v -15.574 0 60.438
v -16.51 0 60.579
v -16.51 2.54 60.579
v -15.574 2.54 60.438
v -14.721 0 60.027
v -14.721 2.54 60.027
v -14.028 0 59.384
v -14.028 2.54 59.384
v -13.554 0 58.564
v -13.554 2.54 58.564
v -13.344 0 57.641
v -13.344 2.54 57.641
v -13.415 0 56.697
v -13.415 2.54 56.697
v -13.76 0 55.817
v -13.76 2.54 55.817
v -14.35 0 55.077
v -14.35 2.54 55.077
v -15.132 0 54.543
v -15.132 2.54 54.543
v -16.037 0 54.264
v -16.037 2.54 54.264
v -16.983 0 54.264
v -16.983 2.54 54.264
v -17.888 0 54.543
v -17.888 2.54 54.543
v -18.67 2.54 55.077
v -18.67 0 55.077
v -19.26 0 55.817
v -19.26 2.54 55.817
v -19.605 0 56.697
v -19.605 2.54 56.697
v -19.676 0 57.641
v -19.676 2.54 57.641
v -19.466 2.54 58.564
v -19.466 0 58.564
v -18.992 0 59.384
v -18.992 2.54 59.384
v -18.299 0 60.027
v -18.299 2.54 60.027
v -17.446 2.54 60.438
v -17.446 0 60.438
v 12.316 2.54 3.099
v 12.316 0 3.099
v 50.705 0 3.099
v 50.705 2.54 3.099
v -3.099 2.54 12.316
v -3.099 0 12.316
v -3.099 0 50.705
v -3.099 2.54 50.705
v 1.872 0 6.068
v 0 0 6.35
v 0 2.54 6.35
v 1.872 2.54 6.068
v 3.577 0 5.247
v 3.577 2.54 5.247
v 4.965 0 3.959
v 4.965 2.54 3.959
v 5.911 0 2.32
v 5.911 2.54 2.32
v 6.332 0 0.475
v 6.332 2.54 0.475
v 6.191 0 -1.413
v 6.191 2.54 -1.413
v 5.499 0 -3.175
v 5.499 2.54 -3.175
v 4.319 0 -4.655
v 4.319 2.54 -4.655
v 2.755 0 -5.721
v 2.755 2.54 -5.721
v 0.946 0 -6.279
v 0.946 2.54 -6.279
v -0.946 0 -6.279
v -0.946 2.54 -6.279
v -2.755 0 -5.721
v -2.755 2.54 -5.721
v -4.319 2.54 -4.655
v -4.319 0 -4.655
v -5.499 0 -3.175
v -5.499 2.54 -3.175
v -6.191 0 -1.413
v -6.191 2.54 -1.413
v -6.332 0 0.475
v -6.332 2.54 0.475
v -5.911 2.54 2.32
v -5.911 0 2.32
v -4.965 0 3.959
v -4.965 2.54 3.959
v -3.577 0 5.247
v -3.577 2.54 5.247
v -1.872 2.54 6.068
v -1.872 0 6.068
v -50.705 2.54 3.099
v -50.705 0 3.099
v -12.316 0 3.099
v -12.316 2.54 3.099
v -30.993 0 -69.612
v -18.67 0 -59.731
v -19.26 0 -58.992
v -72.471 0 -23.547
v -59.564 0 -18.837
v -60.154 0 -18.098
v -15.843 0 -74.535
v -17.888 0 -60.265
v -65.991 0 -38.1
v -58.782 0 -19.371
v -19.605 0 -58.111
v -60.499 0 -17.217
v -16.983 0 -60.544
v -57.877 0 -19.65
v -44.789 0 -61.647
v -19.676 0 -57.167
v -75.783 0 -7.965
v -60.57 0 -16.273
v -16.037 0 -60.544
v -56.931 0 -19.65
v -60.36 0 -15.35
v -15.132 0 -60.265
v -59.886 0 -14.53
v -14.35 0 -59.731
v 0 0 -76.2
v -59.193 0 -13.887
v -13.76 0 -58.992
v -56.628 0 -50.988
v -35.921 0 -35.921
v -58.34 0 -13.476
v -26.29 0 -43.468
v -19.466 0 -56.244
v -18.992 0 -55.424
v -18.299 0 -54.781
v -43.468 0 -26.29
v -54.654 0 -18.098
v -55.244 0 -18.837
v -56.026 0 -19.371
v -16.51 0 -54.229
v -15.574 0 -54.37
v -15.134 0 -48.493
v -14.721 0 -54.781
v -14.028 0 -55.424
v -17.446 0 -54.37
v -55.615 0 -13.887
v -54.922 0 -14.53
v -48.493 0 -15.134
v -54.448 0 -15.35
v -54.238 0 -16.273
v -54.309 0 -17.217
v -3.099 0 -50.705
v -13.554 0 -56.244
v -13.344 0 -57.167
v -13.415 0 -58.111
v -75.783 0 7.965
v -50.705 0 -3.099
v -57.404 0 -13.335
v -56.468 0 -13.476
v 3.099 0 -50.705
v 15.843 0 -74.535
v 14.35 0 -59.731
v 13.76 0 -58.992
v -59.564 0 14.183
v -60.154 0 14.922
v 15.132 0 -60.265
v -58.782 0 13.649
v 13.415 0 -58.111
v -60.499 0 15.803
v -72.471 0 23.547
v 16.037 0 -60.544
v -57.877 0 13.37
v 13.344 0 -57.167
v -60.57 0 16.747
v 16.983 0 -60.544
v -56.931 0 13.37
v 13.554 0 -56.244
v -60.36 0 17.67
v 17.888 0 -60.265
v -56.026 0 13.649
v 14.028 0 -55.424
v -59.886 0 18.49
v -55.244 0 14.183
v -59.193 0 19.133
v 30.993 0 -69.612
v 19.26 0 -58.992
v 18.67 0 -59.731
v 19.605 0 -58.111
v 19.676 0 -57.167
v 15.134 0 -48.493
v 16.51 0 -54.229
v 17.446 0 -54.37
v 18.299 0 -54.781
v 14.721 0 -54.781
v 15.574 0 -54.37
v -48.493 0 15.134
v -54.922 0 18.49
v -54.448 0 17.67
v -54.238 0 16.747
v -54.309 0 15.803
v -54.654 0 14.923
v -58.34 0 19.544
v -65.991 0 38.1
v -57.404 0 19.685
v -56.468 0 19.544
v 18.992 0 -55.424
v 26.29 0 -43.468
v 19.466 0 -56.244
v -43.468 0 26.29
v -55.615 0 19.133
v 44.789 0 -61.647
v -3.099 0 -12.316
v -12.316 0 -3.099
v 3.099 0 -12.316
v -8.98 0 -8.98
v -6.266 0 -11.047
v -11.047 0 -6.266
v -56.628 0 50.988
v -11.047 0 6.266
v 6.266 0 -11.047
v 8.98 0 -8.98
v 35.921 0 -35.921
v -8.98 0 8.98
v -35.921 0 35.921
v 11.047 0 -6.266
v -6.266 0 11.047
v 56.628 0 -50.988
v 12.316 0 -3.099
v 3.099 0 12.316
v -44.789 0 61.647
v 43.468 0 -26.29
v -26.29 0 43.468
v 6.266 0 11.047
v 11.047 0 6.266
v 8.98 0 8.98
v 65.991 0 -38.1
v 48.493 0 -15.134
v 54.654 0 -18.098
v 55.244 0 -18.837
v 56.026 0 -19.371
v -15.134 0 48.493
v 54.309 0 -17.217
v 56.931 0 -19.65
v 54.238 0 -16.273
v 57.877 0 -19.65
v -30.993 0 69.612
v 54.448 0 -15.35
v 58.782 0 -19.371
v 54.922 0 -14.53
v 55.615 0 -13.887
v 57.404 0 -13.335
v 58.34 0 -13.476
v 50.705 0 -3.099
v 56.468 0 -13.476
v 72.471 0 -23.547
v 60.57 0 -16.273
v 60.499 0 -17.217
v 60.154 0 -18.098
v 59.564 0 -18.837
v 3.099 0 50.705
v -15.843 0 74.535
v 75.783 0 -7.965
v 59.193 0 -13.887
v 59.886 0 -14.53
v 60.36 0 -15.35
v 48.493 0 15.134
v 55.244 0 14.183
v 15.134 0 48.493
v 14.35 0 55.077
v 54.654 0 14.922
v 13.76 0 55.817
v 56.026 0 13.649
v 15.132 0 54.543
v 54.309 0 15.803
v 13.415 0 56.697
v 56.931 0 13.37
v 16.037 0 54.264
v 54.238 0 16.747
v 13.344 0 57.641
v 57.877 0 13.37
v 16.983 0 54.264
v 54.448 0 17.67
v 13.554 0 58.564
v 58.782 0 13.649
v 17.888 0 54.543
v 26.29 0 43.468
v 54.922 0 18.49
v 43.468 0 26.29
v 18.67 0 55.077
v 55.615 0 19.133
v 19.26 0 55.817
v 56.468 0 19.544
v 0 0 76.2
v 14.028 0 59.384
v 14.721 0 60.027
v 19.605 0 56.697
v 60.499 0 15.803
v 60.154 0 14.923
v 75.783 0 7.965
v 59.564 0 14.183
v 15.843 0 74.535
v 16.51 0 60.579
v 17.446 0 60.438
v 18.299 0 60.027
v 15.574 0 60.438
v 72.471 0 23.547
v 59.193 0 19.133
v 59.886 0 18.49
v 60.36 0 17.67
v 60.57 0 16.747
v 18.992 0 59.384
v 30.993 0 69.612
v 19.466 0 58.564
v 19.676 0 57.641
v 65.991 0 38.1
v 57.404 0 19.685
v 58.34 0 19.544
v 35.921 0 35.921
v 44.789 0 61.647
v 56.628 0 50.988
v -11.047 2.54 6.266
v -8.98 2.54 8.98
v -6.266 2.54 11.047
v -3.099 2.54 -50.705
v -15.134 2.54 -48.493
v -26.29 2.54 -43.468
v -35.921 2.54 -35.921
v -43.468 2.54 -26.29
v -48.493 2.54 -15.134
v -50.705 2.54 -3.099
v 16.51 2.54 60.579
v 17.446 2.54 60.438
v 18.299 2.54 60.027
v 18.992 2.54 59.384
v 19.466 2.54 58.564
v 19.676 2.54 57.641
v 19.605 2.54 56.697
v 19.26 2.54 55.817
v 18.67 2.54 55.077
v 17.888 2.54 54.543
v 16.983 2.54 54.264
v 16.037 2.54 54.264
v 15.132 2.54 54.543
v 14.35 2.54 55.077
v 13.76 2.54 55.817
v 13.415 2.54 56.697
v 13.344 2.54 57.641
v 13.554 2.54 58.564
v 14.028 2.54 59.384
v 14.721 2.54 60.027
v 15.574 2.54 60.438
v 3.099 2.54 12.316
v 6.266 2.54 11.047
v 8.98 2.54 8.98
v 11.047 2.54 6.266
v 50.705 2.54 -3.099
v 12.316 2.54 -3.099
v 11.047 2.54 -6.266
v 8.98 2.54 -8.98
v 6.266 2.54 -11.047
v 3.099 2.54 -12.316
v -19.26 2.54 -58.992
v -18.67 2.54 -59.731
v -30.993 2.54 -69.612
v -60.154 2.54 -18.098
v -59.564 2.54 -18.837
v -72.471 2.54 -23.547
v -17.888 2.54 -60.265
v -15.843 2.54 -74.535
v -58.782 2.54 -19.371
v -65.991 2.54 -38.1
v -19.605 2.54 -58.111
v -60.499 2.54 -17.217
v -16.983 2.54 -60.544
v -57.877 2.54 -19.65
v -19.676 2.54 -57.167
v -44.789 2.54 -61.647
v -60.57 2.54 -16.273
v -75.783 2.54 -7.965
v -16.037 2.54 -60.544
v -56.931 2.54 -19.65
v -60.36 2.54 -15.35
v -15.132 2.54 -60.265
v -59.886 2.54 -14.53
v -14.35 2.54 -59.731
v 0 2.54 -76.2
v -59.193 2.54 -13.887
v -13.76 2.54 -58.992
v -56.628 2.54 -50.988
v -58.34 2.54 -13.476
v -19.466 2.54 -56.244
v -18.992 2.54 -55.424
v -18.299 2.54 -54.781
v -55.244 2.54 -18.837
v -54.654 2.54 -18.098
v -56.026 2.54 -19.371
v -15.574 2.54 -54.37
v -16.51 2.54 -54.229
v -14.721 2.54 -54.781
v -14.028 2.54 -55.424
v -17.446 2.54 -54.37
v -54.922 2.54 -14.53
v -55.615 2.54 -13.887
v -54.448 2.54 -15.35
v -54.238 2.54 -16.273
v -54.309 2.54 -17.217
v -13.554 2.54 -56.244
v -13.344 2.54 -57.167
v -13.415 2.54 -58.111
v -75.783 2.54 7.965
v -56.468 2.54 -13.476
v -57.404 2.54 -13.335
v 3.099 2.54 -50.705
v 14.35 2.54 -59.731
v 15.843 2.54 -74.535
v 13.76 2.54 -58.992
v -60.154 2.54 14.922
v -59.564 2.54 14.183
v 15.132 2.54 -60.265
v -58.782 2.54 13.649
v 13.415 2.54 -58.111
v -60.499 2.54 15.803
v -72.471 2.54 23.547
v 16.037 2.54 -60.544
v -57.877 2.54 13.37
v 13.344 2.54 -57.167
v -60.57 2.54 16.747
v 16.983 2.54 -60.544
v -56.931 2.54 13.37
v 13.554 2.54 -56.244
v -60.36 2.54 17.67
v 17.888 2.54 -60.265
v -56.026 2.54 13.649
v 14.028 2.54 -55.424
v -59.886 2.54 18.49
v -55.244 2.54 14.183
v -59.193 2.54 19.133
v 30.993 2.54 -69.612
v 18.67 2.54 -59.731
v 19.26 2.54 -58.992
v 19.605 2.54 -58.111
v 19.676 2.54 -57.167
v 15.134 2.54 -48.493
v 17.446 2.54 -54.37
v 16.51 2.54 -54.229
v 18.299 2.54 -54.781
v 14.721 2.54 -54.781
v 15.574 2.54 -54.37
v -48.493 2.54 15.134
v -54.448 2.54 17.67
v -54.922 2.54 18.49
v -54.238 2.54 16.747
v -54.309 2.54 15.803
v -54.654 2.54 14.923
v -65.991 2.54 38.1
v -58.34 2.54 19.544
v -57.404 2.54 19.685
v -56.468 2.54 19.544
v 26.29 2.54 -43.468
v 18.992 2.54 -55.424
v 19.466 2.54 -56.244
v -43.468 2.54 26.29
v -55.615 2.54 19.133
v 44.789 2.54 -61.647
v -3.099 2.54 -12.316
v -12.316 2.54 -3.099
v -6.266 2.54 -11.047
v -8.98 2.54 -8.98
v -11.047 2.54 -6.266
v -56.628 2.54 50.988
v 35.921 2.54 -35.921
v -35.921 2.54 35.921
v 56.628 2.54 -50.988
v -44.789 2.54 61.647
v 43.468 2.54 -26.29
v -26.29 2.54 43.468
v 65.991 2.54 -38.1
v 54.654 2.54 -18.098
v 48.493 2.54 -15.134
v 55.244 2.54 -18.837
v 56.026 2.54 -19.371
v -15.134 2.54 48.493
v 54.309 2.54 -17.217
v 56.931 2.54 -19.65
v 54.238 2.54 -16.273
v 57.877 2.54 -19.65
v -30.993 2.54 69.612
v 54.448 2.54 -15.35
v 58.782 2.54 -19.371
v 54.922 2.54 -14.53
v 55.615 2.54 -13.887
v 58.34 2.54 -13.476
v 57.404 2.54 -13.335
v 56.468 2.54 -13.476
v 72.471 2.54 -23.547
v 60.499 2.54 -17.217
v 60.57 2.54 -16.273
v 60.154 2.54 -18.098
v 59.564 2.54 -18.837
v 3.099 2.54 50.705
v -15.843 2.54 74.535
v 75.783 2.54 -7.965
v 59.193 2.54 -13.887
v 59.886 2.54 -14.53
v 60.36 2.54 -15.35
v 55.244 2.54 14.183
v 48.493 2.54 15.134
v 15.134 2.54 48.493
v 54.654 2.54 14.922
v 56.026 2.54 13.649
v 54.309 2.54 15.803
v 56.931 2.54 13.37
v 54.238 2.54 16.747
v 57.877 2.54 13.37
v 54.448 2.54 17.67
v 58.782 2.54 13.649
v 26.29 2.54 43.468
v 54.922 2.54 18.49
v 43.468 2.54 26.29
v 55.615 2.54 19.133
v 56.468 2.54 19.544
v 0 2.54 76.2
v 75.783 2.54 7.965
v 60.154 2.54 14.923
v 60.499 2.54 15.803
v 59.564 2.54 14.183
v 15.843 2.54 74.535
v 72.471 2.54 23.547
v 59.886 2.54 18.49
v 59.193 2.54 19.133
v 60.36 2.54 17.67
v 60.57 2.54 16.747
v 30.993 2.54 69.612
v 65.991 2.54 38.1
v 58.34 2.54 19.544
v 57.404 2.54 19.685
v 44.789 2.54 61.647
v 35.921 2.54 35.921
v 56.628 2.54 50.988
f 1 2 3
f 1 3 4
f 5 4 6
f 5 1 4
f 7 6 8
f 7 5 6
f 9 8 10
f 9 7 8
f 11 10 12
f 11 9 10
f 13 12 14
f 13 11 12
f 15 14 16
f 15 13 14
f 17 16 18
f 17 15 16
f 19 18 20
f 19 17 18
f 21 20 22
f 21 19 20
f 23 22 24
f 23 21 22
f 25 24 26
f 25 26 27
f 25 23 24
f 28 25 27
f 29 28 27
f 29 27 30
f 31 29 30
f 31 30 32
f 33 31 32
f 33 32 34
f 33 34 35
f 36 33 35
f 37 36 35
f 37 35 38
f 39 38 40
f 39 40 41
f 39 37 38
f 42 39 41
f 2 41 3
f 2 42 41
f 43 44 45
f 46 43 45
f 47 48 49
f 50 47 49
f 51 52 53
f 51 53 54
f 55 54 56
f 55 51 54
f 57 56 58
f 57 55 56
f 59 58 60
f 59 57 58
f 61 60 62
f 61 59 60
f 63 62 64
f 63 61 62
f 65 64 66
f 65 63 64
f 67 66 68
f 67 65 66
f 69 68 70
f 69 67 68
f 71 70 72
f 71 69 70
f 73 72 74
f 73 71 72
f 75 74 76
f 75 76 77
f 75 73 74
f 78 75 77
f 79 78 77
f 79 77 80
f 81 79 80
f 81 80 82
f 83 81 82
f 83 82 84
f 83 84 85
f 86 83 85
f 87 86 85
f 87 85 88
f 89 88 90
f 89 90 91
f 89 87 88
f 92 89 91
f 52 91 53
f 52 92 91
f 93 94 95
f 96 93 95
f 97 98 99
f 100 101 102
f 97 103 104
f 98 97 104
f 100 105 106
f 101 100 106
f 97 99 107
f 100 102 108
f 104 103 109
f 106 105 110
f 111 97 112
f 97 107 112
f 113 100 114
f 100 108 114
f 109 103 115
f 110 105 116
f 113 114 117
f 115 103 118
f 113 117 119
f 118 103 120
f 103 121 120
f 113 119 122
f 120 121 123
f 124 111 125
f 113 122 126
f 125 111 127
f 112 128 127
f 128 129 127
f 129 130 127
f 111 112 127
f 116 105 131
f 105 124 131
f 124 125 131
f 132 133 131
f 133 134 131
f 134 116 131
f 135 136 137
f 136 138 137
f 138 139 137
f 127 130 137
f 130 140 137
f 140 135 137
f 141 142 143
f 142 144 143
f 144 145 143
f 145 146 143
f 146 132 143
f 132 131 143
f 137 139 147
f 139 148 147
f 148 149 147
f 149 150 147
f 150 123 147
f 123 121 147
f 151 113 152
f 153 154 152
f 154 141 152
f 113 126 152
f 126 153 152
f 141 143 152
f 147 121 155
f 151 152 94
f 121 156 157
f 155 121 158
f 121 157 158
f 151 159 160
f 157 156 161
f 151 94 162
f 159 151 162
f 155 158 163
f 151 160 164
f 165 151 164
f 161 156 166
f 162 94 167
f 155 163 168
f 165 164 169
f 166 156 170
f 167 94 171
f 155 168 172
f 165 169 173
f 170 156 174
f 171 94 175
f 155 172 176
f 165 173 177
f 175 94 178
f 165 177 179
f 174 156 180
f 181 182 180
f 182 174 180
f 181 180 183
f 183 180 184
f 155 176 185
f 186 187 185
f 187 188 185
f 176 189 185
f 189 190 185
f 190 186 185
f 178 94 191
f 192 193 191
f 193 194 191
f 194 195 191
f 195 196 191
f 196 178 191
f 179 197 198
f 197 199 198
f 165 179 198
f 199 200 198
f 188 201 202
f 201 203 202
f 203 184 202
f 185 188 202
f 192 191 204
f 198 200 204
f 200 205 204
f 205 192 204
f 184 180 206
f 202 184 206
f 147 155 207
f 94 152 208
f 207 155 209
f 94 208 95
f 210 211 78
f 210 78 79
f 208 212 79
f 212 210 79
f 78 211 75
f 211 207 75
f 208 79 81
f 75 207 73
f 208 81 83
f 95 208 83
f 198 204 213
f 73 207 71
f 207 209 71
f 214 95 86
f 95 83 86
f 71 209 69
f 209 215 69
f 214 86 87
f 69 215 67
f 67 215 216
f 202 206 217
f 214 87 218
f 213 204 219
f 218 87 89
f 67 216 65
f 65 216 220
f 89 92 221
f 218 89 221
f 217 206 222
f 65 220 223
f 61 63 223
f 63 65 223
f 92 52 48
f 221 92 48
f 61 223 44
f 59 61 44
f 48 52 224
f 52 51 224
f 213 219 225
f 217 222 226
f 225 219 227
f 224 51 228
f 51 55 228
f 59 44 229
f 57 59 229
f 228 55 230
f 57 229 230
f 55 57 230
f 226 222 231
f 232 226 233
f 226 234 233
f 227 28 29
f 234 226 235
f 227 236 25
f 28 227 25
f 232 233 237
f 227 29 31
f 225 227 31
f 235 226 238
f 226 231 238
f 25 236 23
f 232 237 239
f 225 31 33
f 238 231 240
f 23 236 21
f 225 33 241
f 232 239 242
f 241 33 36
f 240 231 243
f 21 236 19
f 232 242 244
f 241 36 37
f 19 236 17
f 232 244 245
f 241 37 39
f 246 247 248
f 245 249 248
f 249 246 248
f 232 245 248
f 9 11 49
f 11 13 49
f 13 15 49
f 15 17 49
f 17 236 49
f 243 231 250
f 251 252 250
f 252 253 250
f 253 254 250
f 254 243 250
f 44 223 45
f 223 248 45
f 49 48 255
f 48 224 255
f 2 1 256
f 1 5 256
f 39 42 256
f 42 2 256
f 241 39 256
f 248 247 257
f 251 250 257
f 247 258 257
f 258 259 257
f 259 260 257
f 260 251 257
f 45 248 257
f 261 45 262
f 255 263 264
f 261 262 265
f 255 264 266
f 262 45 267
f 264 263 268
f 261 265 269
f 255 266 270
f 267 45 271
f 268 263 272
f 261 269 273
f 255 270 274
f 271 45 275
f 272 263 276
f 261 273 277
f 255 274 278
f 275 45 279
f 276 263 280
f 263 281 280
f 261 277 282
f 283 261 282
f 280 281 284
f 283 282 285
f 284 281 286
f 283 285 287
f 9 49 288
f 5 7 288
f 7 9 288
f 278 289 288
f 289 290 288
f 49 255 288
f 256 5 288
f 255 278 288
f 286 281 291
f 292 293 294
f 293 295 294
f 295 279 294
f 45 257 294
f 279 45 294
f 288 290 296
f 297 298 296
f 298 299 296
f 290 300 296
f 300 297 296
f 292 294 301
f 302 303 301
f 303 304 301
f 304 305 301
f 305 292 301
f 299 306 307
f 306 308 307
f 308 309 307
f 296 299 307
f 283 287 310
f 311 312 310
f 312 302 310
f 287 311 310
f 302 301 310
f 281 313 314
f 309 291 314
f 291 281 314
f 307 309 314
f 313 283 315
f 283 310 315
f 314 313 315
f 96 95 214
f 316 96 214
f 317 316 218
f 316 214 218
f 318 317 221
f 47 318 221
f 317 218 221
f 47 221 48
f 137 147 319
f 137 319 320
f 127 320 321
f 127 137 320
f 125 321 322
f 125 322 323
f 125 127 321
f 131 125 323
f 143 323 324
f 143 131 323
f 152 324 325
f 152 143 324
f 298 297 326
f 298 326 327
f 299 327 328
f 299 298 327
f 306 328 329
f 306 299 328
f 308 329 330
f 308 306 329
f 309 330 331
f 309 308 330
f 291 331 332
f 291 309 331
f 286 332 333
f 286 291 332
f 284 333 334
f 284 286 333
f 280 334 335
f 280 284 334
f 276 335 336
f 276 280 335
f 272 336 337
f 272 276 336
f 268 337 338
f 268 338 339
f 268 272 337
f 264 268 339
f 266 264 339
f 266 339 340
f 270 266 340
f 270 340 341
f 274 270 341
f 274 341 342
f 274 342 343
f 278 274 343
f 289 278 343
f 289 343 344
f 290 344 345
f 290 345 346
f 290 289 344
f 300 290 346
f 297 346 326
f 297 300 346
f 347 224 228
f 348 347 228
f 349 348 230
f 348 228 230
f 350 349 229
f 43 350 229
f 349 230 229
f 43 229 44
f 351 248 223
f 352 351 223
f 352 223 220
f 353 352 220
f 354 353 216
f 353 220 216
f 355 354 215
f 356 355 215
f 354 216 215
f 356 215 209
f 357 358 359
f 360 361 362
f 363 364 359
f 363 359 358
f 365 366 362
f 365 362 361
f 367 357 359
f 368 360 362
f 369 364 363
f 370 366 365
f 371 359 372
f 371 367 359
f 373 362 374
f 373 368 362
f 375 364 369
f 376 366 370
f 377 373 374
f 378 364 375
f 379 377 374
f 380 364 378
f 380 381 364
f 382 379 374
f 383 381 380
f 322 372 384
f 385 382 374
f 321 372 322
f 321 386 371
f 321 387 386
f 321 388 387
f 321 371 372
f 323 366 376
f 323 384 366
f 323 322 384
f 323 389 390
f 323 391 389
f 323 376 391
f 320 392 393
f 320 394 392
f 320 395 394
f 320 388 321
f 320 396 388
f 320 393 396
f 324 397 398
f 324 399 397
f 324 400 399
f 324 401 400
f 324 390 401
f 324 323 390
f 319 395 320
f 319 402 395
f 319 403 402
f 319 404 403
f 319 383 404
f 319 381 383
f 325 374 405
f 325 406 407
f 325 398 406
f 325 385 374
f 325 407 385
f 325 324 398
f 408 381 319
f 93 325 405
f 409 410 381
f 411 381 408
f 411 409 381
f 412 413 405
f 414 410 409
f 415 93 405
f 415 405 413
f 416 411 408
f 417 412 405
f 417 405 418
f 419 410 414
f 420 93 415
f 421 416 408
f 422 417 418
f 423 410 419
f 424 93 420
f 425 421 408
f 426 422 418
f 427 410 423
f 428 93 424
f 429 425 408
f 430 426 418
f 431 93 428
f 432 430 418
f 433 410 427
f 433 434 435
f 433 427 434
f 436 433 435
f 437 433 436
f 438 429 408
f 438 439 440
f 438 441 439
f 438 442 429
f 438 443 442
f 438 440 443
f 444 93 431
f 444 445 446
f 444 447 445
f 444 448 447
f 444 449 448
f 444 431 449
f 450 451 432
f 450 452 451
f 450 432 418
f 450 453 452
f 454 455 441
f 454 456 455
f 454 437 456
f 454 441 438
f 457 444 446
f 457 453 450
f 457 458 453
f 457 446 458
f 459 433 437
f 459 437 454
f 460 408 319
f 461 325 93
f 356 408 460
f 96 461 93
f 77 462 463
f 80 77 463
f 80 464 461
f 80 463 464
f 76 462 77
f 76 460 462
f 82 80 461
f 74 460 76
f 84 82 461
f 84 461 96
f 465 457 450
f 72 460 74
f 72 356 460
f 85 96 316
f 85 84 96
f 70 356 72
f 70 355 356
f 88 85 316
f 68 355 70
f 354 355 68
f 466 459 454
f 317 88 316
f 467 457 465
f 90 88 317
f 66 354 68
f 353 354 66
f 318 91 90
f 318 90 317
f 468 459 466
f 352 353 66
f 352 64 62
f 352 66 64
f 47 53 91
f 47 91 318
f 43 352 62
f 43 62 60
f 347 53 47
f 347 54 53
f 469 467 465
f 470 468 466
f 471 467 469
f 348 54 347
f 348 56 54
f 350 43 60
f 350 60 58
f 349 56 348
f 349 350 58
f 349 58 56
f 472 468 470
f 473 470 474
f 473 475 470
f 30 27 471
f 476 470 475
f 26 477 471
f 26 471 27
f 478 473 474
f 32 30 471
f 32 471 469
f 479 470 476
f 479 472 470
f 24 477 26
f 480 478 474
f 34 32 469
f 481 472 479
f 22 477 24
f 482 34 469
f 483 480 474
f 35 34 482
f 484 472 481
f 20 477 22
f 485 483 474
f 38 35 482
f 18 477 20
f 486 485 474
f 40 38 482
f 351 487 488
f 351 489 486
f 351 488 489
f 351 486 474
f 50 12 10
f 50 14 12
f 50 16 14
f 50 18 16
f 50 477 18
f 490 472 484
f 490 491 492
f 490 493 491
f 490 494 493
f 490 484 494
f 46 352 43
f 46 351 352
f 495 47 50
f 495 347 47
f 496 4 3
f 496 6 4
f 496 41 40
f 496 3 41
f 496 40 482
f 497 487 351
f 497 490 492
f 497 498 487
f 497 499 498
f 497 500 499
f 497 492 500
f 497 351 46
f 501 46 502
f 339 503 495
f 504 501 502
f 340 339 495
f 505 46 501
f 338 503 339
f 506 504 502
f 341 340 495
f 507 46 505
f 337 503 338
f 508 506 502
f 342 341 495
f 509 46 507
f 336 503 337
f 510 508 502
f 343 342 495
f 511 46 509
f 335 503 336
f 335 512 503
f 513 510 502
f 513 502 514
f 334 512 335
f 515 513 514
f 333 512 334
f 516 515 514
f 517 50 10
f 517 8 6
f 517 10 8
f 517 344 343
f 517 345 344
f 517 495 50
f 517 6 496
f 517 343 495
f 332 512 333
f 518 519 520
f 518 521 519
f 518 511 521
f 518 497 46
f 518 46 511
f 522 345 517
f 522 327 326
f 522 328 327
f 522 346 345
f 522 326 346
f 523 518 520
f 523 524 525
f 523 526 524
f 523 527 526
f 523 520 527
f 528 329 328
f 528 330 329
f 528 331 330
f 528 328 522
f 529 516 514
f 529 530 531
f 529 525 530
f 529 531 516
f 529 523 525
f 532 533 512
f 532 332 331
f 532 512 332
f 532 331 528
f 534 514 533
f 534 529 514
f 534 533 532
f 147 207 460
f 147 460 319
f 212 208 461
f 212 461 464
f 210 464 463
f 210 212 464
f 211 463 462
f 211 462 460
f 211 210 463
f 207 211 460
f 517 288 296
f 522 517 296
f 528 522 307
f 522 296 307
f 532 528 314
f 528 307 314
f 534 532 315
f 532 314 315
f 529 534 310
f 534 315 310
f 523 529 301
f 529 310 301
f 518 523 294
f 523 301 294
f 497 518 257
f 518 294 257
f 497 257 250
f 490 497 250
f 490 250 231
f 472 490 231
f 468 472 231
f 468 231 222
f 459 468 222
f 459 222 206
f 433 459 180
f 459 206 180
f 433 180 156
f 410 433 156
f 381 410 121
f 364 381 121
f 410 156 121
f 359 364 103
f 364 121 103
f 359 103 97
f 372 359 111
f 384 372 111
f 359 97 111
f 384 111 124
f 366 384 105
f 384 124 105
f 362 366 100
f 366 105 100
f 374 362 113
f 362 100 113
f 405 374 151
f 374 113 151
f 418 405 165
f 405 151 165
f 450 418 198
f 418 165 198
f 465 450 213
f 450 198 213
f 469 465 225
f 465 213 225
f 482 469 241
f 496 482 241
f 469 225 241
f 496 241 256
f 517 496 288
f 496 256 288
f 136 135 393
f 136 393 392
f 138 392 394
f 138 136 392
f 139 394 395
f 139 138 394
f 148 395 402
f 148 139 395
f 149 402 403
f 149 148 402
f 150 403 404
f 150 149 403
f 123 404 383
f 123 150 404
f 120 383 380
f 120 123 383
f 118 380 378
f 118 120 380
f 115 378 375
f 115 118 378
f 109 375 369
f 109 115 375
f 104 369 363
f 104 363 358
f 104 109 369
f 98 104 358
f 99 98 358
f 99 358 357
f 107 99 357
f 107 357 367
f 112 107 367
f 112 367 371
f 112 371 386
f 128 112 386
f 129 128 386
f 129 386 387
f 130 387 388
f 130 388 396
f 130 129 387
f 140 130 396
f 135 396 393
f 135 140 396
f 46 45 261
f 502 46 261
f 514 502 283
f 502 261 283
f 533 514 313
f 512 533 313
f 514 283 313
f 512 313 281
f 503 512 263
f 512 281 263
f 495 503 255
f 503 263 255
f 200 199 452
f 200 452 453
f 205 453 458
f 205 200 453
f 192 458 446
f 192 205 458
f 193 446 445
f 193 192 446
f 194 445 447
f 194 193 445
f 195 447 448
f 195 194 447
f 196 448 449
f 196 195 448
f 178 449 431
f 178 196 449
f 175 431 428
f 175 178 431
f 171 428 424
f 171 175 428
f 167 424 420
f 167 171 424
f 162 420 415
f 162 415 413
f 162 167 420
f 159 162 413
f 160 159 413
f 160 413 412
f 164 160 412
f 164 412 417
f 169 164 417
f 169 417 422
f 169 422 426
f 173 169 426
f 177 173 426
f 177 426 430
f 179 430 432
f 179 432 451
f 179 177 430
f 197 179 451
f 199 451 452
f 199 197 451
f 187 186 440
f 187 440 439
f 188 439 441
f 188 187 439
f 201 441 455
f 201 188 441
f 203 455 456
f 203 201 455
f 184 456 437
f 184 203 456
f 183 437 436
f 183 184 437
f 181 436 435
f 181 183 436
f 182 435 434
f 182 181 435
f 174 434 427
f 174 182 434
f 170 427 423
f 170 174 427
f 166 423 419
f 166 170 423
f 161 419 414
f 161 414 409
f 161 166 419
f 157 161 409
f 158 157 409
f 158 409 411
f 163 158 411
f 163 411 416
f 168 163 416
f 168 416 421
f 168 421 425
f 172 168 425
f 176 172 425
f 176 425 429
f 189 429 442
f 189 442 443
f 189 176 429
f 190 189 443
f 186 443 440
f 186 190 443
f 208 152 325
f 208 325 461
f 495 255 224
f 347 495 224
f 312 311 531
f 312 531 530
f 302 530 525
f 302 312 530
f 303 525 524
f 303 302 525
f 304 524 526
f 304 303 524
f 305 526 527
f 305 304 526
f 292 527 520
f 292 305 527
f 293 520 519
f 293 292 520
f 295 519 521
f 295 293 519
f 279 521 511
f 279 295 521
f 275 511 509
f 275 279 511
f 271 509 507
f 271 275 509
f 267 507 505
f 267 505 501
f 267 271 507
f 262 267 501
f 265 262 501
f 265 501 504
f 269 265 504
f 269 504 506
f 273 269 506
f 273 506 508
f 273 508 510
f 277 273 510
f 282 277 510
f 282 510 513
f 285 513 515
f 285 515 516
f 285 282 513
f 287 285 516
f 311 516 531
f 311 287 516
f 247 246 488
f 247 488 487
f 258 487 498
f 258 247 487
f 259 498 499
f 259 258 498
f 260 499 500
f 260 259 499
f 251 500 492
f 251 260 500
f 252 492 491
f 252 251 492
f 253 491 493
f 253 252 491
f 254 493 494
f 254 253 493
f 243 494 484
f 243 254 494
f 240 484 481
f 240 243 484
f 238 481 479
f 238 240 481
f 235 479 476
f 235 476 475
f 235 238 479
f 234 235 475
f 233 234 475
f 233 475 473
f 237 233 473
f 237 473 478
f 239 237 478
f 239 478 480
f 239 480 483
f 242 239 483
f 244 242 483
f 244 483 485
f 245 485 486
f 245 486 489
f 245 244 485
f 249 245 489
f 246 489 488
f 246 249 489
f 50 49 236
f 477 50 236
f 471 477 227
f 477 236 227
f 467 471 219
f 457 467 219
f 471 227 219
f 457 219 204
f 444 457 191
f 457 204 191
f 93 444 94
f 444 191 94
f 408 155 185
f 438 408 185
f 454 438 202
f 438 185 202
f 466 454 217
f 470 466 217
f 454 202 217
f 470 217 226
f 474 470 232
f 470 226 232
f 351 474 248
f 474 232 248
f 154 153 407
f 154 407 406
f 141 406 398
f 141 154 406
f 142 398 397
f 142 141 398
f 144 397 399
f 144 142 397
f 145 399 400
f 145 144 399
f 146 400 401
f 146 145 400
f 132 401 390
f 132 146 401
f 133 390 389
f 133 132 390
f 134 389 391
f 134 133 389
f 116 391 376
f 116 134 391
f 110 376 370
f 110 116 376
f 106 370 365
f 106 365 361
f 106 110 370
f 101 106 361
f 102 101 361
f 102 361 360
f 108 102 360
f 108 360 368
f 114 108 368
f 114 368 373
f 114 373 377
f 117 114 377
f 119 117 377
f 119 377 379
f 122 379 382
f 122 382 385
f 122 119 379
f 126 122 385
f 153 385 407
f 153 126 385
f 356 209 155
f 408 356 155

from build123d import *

# Parameters (mm, degrees)
SKETCH1_R           = 76.2
SKETCH1_R_2         = 3.175
SKETCH1_R_3         = 6.35
BOSS_EXTRUDE1_DEPTH = 2.54


with BuildPart() as part:
    # Sketch1 → Boss-Extrude1 (new body)
    with BuildSketch(Plane(origin=(0, 0, 0), x_dir=(1, 0, 0), z_dir=(0, 1, 0))):
        with Locations(Location((0, 0, 0), (0, 0, 270))):
            Circle(SKETCH1_R)
        with Locations(Location((-16.51, 57.404, 0), (0, 0, 270))):
            Circle(SKETCH1_R_2, mode=Mode.SUBTRACT)
        with Locations(Location((16.51, 57.404, 0), (0, 0, 270))):
            Circle(SKETCH1_R_2, mode=Mode.SUBTRACT)
        with Locations(Location((57.404, -16.51, 0), (0, 0, 270))):
            Circle(SKETCH1_R_2, mode=Mode.SUBTRACT)
        with Locations(Location((57.404, 16.51, 0), (0, 0, 270))):
            Circle(SKETCH1_R_2, mode=Mode.SUBTRACT)
        with Locations(Location((-16.51, -57.404, 0), (0, 0, 270))):
            Circle(SKETCH1_R_2, mode=Mode.SUBTRACT)
        with Locations(Location((16.51, -57.404, 0), (0, 0, 270))):
            Circle(SKETCH1_R_2, mode=Mode.SUBTRACT)
        with Locations(Location((-57.404, 16.51, 0), (0, 0, 270))):
            Circle(SKETCH1_R_2, mode=Mode.SUBTRACT)
        with Locations(Location((-57.404, -16.51, 0), (0, 0, 270))):
            Circle(SKETCH1_R_2, mode=Mode.SUBTRACT)
        with Locations(Location((0, 0, 0), (0, 0, 270))):
            Circle(SKETCH1_R_3, mode=Mode.SUBTRACT)
        with BuildLine():
            Line((-3.099389971, 12.315996988), (-3.099389971, 50.705362456))
            ThreePointArc((-3.099389971, 50.705362456), (-35.921024484, 35.921024484), (-50.705362456, 3.099389971))
            Line((-50.705362456, 3.099389971), (-12.315996988, 3.099389971))
            ThreePointArc((-12.315996988, 3.099389971), (-8.980256121, 8.980256121), (-3.099389971, 12.315996988))
        make_face(mode=Mode.SUBTRACT)
        with BuildLine():
            Line((3.099389971, 12.315996988), (3.099389971, 50.705362456))
            ThreePointArc((3.099389971, 50.705362456), (35.921024484, 35.921024484), (50.705362456, 3.099389971))
            Line((50.705362456, 3.099389971), (12.315996988, 3.099389971))
            ThreePointArc((12.315996988, 3.099389971), (8.980256121, 8.980256121), (3.099389971, 12.315996988))
        make_face(mode=Mode.SUBTRACT)
        with BuildLine():
            Line((12.315996988, -3.099389971), (50.705362456, -3.099389971))
            ThreePointArc((50.705362456, -3.099389971), (35.921024484, -35.921024484), (3.099389971, -50.705362456))
            Line((3.099389971, -50.705362456), (3.099389971, -12.315996988))
            ThreePointArc((3.099389971, -12.315996988), (8.980256121, -8.980256121), (12.315996988, -3.099389971))
        make_face(mode=Mode.SUBTRACT)
        with BuildLine():
            Line((-3.099389971, -12.315996988), (-3.099389971, -50.705362456))
            ThreePointArc((-3.099389971, -50.705362456), (-35.921024484, -35.921024484), (-50.705362456, -3.099389971))
            Line((-50.705362456, -3.099389971), (-12.315996988, -3.099389971))
            ThreePointArc((-12.315996988, -3.099389971), (-8.980256121, -8.980256121), (-3.099389971, -12.315996988))
        make_face(mode=Mode.SUBTRACT)
    extrude(amount=BOSS_EXTRUDE1_DEPTH)


solid = part.part
